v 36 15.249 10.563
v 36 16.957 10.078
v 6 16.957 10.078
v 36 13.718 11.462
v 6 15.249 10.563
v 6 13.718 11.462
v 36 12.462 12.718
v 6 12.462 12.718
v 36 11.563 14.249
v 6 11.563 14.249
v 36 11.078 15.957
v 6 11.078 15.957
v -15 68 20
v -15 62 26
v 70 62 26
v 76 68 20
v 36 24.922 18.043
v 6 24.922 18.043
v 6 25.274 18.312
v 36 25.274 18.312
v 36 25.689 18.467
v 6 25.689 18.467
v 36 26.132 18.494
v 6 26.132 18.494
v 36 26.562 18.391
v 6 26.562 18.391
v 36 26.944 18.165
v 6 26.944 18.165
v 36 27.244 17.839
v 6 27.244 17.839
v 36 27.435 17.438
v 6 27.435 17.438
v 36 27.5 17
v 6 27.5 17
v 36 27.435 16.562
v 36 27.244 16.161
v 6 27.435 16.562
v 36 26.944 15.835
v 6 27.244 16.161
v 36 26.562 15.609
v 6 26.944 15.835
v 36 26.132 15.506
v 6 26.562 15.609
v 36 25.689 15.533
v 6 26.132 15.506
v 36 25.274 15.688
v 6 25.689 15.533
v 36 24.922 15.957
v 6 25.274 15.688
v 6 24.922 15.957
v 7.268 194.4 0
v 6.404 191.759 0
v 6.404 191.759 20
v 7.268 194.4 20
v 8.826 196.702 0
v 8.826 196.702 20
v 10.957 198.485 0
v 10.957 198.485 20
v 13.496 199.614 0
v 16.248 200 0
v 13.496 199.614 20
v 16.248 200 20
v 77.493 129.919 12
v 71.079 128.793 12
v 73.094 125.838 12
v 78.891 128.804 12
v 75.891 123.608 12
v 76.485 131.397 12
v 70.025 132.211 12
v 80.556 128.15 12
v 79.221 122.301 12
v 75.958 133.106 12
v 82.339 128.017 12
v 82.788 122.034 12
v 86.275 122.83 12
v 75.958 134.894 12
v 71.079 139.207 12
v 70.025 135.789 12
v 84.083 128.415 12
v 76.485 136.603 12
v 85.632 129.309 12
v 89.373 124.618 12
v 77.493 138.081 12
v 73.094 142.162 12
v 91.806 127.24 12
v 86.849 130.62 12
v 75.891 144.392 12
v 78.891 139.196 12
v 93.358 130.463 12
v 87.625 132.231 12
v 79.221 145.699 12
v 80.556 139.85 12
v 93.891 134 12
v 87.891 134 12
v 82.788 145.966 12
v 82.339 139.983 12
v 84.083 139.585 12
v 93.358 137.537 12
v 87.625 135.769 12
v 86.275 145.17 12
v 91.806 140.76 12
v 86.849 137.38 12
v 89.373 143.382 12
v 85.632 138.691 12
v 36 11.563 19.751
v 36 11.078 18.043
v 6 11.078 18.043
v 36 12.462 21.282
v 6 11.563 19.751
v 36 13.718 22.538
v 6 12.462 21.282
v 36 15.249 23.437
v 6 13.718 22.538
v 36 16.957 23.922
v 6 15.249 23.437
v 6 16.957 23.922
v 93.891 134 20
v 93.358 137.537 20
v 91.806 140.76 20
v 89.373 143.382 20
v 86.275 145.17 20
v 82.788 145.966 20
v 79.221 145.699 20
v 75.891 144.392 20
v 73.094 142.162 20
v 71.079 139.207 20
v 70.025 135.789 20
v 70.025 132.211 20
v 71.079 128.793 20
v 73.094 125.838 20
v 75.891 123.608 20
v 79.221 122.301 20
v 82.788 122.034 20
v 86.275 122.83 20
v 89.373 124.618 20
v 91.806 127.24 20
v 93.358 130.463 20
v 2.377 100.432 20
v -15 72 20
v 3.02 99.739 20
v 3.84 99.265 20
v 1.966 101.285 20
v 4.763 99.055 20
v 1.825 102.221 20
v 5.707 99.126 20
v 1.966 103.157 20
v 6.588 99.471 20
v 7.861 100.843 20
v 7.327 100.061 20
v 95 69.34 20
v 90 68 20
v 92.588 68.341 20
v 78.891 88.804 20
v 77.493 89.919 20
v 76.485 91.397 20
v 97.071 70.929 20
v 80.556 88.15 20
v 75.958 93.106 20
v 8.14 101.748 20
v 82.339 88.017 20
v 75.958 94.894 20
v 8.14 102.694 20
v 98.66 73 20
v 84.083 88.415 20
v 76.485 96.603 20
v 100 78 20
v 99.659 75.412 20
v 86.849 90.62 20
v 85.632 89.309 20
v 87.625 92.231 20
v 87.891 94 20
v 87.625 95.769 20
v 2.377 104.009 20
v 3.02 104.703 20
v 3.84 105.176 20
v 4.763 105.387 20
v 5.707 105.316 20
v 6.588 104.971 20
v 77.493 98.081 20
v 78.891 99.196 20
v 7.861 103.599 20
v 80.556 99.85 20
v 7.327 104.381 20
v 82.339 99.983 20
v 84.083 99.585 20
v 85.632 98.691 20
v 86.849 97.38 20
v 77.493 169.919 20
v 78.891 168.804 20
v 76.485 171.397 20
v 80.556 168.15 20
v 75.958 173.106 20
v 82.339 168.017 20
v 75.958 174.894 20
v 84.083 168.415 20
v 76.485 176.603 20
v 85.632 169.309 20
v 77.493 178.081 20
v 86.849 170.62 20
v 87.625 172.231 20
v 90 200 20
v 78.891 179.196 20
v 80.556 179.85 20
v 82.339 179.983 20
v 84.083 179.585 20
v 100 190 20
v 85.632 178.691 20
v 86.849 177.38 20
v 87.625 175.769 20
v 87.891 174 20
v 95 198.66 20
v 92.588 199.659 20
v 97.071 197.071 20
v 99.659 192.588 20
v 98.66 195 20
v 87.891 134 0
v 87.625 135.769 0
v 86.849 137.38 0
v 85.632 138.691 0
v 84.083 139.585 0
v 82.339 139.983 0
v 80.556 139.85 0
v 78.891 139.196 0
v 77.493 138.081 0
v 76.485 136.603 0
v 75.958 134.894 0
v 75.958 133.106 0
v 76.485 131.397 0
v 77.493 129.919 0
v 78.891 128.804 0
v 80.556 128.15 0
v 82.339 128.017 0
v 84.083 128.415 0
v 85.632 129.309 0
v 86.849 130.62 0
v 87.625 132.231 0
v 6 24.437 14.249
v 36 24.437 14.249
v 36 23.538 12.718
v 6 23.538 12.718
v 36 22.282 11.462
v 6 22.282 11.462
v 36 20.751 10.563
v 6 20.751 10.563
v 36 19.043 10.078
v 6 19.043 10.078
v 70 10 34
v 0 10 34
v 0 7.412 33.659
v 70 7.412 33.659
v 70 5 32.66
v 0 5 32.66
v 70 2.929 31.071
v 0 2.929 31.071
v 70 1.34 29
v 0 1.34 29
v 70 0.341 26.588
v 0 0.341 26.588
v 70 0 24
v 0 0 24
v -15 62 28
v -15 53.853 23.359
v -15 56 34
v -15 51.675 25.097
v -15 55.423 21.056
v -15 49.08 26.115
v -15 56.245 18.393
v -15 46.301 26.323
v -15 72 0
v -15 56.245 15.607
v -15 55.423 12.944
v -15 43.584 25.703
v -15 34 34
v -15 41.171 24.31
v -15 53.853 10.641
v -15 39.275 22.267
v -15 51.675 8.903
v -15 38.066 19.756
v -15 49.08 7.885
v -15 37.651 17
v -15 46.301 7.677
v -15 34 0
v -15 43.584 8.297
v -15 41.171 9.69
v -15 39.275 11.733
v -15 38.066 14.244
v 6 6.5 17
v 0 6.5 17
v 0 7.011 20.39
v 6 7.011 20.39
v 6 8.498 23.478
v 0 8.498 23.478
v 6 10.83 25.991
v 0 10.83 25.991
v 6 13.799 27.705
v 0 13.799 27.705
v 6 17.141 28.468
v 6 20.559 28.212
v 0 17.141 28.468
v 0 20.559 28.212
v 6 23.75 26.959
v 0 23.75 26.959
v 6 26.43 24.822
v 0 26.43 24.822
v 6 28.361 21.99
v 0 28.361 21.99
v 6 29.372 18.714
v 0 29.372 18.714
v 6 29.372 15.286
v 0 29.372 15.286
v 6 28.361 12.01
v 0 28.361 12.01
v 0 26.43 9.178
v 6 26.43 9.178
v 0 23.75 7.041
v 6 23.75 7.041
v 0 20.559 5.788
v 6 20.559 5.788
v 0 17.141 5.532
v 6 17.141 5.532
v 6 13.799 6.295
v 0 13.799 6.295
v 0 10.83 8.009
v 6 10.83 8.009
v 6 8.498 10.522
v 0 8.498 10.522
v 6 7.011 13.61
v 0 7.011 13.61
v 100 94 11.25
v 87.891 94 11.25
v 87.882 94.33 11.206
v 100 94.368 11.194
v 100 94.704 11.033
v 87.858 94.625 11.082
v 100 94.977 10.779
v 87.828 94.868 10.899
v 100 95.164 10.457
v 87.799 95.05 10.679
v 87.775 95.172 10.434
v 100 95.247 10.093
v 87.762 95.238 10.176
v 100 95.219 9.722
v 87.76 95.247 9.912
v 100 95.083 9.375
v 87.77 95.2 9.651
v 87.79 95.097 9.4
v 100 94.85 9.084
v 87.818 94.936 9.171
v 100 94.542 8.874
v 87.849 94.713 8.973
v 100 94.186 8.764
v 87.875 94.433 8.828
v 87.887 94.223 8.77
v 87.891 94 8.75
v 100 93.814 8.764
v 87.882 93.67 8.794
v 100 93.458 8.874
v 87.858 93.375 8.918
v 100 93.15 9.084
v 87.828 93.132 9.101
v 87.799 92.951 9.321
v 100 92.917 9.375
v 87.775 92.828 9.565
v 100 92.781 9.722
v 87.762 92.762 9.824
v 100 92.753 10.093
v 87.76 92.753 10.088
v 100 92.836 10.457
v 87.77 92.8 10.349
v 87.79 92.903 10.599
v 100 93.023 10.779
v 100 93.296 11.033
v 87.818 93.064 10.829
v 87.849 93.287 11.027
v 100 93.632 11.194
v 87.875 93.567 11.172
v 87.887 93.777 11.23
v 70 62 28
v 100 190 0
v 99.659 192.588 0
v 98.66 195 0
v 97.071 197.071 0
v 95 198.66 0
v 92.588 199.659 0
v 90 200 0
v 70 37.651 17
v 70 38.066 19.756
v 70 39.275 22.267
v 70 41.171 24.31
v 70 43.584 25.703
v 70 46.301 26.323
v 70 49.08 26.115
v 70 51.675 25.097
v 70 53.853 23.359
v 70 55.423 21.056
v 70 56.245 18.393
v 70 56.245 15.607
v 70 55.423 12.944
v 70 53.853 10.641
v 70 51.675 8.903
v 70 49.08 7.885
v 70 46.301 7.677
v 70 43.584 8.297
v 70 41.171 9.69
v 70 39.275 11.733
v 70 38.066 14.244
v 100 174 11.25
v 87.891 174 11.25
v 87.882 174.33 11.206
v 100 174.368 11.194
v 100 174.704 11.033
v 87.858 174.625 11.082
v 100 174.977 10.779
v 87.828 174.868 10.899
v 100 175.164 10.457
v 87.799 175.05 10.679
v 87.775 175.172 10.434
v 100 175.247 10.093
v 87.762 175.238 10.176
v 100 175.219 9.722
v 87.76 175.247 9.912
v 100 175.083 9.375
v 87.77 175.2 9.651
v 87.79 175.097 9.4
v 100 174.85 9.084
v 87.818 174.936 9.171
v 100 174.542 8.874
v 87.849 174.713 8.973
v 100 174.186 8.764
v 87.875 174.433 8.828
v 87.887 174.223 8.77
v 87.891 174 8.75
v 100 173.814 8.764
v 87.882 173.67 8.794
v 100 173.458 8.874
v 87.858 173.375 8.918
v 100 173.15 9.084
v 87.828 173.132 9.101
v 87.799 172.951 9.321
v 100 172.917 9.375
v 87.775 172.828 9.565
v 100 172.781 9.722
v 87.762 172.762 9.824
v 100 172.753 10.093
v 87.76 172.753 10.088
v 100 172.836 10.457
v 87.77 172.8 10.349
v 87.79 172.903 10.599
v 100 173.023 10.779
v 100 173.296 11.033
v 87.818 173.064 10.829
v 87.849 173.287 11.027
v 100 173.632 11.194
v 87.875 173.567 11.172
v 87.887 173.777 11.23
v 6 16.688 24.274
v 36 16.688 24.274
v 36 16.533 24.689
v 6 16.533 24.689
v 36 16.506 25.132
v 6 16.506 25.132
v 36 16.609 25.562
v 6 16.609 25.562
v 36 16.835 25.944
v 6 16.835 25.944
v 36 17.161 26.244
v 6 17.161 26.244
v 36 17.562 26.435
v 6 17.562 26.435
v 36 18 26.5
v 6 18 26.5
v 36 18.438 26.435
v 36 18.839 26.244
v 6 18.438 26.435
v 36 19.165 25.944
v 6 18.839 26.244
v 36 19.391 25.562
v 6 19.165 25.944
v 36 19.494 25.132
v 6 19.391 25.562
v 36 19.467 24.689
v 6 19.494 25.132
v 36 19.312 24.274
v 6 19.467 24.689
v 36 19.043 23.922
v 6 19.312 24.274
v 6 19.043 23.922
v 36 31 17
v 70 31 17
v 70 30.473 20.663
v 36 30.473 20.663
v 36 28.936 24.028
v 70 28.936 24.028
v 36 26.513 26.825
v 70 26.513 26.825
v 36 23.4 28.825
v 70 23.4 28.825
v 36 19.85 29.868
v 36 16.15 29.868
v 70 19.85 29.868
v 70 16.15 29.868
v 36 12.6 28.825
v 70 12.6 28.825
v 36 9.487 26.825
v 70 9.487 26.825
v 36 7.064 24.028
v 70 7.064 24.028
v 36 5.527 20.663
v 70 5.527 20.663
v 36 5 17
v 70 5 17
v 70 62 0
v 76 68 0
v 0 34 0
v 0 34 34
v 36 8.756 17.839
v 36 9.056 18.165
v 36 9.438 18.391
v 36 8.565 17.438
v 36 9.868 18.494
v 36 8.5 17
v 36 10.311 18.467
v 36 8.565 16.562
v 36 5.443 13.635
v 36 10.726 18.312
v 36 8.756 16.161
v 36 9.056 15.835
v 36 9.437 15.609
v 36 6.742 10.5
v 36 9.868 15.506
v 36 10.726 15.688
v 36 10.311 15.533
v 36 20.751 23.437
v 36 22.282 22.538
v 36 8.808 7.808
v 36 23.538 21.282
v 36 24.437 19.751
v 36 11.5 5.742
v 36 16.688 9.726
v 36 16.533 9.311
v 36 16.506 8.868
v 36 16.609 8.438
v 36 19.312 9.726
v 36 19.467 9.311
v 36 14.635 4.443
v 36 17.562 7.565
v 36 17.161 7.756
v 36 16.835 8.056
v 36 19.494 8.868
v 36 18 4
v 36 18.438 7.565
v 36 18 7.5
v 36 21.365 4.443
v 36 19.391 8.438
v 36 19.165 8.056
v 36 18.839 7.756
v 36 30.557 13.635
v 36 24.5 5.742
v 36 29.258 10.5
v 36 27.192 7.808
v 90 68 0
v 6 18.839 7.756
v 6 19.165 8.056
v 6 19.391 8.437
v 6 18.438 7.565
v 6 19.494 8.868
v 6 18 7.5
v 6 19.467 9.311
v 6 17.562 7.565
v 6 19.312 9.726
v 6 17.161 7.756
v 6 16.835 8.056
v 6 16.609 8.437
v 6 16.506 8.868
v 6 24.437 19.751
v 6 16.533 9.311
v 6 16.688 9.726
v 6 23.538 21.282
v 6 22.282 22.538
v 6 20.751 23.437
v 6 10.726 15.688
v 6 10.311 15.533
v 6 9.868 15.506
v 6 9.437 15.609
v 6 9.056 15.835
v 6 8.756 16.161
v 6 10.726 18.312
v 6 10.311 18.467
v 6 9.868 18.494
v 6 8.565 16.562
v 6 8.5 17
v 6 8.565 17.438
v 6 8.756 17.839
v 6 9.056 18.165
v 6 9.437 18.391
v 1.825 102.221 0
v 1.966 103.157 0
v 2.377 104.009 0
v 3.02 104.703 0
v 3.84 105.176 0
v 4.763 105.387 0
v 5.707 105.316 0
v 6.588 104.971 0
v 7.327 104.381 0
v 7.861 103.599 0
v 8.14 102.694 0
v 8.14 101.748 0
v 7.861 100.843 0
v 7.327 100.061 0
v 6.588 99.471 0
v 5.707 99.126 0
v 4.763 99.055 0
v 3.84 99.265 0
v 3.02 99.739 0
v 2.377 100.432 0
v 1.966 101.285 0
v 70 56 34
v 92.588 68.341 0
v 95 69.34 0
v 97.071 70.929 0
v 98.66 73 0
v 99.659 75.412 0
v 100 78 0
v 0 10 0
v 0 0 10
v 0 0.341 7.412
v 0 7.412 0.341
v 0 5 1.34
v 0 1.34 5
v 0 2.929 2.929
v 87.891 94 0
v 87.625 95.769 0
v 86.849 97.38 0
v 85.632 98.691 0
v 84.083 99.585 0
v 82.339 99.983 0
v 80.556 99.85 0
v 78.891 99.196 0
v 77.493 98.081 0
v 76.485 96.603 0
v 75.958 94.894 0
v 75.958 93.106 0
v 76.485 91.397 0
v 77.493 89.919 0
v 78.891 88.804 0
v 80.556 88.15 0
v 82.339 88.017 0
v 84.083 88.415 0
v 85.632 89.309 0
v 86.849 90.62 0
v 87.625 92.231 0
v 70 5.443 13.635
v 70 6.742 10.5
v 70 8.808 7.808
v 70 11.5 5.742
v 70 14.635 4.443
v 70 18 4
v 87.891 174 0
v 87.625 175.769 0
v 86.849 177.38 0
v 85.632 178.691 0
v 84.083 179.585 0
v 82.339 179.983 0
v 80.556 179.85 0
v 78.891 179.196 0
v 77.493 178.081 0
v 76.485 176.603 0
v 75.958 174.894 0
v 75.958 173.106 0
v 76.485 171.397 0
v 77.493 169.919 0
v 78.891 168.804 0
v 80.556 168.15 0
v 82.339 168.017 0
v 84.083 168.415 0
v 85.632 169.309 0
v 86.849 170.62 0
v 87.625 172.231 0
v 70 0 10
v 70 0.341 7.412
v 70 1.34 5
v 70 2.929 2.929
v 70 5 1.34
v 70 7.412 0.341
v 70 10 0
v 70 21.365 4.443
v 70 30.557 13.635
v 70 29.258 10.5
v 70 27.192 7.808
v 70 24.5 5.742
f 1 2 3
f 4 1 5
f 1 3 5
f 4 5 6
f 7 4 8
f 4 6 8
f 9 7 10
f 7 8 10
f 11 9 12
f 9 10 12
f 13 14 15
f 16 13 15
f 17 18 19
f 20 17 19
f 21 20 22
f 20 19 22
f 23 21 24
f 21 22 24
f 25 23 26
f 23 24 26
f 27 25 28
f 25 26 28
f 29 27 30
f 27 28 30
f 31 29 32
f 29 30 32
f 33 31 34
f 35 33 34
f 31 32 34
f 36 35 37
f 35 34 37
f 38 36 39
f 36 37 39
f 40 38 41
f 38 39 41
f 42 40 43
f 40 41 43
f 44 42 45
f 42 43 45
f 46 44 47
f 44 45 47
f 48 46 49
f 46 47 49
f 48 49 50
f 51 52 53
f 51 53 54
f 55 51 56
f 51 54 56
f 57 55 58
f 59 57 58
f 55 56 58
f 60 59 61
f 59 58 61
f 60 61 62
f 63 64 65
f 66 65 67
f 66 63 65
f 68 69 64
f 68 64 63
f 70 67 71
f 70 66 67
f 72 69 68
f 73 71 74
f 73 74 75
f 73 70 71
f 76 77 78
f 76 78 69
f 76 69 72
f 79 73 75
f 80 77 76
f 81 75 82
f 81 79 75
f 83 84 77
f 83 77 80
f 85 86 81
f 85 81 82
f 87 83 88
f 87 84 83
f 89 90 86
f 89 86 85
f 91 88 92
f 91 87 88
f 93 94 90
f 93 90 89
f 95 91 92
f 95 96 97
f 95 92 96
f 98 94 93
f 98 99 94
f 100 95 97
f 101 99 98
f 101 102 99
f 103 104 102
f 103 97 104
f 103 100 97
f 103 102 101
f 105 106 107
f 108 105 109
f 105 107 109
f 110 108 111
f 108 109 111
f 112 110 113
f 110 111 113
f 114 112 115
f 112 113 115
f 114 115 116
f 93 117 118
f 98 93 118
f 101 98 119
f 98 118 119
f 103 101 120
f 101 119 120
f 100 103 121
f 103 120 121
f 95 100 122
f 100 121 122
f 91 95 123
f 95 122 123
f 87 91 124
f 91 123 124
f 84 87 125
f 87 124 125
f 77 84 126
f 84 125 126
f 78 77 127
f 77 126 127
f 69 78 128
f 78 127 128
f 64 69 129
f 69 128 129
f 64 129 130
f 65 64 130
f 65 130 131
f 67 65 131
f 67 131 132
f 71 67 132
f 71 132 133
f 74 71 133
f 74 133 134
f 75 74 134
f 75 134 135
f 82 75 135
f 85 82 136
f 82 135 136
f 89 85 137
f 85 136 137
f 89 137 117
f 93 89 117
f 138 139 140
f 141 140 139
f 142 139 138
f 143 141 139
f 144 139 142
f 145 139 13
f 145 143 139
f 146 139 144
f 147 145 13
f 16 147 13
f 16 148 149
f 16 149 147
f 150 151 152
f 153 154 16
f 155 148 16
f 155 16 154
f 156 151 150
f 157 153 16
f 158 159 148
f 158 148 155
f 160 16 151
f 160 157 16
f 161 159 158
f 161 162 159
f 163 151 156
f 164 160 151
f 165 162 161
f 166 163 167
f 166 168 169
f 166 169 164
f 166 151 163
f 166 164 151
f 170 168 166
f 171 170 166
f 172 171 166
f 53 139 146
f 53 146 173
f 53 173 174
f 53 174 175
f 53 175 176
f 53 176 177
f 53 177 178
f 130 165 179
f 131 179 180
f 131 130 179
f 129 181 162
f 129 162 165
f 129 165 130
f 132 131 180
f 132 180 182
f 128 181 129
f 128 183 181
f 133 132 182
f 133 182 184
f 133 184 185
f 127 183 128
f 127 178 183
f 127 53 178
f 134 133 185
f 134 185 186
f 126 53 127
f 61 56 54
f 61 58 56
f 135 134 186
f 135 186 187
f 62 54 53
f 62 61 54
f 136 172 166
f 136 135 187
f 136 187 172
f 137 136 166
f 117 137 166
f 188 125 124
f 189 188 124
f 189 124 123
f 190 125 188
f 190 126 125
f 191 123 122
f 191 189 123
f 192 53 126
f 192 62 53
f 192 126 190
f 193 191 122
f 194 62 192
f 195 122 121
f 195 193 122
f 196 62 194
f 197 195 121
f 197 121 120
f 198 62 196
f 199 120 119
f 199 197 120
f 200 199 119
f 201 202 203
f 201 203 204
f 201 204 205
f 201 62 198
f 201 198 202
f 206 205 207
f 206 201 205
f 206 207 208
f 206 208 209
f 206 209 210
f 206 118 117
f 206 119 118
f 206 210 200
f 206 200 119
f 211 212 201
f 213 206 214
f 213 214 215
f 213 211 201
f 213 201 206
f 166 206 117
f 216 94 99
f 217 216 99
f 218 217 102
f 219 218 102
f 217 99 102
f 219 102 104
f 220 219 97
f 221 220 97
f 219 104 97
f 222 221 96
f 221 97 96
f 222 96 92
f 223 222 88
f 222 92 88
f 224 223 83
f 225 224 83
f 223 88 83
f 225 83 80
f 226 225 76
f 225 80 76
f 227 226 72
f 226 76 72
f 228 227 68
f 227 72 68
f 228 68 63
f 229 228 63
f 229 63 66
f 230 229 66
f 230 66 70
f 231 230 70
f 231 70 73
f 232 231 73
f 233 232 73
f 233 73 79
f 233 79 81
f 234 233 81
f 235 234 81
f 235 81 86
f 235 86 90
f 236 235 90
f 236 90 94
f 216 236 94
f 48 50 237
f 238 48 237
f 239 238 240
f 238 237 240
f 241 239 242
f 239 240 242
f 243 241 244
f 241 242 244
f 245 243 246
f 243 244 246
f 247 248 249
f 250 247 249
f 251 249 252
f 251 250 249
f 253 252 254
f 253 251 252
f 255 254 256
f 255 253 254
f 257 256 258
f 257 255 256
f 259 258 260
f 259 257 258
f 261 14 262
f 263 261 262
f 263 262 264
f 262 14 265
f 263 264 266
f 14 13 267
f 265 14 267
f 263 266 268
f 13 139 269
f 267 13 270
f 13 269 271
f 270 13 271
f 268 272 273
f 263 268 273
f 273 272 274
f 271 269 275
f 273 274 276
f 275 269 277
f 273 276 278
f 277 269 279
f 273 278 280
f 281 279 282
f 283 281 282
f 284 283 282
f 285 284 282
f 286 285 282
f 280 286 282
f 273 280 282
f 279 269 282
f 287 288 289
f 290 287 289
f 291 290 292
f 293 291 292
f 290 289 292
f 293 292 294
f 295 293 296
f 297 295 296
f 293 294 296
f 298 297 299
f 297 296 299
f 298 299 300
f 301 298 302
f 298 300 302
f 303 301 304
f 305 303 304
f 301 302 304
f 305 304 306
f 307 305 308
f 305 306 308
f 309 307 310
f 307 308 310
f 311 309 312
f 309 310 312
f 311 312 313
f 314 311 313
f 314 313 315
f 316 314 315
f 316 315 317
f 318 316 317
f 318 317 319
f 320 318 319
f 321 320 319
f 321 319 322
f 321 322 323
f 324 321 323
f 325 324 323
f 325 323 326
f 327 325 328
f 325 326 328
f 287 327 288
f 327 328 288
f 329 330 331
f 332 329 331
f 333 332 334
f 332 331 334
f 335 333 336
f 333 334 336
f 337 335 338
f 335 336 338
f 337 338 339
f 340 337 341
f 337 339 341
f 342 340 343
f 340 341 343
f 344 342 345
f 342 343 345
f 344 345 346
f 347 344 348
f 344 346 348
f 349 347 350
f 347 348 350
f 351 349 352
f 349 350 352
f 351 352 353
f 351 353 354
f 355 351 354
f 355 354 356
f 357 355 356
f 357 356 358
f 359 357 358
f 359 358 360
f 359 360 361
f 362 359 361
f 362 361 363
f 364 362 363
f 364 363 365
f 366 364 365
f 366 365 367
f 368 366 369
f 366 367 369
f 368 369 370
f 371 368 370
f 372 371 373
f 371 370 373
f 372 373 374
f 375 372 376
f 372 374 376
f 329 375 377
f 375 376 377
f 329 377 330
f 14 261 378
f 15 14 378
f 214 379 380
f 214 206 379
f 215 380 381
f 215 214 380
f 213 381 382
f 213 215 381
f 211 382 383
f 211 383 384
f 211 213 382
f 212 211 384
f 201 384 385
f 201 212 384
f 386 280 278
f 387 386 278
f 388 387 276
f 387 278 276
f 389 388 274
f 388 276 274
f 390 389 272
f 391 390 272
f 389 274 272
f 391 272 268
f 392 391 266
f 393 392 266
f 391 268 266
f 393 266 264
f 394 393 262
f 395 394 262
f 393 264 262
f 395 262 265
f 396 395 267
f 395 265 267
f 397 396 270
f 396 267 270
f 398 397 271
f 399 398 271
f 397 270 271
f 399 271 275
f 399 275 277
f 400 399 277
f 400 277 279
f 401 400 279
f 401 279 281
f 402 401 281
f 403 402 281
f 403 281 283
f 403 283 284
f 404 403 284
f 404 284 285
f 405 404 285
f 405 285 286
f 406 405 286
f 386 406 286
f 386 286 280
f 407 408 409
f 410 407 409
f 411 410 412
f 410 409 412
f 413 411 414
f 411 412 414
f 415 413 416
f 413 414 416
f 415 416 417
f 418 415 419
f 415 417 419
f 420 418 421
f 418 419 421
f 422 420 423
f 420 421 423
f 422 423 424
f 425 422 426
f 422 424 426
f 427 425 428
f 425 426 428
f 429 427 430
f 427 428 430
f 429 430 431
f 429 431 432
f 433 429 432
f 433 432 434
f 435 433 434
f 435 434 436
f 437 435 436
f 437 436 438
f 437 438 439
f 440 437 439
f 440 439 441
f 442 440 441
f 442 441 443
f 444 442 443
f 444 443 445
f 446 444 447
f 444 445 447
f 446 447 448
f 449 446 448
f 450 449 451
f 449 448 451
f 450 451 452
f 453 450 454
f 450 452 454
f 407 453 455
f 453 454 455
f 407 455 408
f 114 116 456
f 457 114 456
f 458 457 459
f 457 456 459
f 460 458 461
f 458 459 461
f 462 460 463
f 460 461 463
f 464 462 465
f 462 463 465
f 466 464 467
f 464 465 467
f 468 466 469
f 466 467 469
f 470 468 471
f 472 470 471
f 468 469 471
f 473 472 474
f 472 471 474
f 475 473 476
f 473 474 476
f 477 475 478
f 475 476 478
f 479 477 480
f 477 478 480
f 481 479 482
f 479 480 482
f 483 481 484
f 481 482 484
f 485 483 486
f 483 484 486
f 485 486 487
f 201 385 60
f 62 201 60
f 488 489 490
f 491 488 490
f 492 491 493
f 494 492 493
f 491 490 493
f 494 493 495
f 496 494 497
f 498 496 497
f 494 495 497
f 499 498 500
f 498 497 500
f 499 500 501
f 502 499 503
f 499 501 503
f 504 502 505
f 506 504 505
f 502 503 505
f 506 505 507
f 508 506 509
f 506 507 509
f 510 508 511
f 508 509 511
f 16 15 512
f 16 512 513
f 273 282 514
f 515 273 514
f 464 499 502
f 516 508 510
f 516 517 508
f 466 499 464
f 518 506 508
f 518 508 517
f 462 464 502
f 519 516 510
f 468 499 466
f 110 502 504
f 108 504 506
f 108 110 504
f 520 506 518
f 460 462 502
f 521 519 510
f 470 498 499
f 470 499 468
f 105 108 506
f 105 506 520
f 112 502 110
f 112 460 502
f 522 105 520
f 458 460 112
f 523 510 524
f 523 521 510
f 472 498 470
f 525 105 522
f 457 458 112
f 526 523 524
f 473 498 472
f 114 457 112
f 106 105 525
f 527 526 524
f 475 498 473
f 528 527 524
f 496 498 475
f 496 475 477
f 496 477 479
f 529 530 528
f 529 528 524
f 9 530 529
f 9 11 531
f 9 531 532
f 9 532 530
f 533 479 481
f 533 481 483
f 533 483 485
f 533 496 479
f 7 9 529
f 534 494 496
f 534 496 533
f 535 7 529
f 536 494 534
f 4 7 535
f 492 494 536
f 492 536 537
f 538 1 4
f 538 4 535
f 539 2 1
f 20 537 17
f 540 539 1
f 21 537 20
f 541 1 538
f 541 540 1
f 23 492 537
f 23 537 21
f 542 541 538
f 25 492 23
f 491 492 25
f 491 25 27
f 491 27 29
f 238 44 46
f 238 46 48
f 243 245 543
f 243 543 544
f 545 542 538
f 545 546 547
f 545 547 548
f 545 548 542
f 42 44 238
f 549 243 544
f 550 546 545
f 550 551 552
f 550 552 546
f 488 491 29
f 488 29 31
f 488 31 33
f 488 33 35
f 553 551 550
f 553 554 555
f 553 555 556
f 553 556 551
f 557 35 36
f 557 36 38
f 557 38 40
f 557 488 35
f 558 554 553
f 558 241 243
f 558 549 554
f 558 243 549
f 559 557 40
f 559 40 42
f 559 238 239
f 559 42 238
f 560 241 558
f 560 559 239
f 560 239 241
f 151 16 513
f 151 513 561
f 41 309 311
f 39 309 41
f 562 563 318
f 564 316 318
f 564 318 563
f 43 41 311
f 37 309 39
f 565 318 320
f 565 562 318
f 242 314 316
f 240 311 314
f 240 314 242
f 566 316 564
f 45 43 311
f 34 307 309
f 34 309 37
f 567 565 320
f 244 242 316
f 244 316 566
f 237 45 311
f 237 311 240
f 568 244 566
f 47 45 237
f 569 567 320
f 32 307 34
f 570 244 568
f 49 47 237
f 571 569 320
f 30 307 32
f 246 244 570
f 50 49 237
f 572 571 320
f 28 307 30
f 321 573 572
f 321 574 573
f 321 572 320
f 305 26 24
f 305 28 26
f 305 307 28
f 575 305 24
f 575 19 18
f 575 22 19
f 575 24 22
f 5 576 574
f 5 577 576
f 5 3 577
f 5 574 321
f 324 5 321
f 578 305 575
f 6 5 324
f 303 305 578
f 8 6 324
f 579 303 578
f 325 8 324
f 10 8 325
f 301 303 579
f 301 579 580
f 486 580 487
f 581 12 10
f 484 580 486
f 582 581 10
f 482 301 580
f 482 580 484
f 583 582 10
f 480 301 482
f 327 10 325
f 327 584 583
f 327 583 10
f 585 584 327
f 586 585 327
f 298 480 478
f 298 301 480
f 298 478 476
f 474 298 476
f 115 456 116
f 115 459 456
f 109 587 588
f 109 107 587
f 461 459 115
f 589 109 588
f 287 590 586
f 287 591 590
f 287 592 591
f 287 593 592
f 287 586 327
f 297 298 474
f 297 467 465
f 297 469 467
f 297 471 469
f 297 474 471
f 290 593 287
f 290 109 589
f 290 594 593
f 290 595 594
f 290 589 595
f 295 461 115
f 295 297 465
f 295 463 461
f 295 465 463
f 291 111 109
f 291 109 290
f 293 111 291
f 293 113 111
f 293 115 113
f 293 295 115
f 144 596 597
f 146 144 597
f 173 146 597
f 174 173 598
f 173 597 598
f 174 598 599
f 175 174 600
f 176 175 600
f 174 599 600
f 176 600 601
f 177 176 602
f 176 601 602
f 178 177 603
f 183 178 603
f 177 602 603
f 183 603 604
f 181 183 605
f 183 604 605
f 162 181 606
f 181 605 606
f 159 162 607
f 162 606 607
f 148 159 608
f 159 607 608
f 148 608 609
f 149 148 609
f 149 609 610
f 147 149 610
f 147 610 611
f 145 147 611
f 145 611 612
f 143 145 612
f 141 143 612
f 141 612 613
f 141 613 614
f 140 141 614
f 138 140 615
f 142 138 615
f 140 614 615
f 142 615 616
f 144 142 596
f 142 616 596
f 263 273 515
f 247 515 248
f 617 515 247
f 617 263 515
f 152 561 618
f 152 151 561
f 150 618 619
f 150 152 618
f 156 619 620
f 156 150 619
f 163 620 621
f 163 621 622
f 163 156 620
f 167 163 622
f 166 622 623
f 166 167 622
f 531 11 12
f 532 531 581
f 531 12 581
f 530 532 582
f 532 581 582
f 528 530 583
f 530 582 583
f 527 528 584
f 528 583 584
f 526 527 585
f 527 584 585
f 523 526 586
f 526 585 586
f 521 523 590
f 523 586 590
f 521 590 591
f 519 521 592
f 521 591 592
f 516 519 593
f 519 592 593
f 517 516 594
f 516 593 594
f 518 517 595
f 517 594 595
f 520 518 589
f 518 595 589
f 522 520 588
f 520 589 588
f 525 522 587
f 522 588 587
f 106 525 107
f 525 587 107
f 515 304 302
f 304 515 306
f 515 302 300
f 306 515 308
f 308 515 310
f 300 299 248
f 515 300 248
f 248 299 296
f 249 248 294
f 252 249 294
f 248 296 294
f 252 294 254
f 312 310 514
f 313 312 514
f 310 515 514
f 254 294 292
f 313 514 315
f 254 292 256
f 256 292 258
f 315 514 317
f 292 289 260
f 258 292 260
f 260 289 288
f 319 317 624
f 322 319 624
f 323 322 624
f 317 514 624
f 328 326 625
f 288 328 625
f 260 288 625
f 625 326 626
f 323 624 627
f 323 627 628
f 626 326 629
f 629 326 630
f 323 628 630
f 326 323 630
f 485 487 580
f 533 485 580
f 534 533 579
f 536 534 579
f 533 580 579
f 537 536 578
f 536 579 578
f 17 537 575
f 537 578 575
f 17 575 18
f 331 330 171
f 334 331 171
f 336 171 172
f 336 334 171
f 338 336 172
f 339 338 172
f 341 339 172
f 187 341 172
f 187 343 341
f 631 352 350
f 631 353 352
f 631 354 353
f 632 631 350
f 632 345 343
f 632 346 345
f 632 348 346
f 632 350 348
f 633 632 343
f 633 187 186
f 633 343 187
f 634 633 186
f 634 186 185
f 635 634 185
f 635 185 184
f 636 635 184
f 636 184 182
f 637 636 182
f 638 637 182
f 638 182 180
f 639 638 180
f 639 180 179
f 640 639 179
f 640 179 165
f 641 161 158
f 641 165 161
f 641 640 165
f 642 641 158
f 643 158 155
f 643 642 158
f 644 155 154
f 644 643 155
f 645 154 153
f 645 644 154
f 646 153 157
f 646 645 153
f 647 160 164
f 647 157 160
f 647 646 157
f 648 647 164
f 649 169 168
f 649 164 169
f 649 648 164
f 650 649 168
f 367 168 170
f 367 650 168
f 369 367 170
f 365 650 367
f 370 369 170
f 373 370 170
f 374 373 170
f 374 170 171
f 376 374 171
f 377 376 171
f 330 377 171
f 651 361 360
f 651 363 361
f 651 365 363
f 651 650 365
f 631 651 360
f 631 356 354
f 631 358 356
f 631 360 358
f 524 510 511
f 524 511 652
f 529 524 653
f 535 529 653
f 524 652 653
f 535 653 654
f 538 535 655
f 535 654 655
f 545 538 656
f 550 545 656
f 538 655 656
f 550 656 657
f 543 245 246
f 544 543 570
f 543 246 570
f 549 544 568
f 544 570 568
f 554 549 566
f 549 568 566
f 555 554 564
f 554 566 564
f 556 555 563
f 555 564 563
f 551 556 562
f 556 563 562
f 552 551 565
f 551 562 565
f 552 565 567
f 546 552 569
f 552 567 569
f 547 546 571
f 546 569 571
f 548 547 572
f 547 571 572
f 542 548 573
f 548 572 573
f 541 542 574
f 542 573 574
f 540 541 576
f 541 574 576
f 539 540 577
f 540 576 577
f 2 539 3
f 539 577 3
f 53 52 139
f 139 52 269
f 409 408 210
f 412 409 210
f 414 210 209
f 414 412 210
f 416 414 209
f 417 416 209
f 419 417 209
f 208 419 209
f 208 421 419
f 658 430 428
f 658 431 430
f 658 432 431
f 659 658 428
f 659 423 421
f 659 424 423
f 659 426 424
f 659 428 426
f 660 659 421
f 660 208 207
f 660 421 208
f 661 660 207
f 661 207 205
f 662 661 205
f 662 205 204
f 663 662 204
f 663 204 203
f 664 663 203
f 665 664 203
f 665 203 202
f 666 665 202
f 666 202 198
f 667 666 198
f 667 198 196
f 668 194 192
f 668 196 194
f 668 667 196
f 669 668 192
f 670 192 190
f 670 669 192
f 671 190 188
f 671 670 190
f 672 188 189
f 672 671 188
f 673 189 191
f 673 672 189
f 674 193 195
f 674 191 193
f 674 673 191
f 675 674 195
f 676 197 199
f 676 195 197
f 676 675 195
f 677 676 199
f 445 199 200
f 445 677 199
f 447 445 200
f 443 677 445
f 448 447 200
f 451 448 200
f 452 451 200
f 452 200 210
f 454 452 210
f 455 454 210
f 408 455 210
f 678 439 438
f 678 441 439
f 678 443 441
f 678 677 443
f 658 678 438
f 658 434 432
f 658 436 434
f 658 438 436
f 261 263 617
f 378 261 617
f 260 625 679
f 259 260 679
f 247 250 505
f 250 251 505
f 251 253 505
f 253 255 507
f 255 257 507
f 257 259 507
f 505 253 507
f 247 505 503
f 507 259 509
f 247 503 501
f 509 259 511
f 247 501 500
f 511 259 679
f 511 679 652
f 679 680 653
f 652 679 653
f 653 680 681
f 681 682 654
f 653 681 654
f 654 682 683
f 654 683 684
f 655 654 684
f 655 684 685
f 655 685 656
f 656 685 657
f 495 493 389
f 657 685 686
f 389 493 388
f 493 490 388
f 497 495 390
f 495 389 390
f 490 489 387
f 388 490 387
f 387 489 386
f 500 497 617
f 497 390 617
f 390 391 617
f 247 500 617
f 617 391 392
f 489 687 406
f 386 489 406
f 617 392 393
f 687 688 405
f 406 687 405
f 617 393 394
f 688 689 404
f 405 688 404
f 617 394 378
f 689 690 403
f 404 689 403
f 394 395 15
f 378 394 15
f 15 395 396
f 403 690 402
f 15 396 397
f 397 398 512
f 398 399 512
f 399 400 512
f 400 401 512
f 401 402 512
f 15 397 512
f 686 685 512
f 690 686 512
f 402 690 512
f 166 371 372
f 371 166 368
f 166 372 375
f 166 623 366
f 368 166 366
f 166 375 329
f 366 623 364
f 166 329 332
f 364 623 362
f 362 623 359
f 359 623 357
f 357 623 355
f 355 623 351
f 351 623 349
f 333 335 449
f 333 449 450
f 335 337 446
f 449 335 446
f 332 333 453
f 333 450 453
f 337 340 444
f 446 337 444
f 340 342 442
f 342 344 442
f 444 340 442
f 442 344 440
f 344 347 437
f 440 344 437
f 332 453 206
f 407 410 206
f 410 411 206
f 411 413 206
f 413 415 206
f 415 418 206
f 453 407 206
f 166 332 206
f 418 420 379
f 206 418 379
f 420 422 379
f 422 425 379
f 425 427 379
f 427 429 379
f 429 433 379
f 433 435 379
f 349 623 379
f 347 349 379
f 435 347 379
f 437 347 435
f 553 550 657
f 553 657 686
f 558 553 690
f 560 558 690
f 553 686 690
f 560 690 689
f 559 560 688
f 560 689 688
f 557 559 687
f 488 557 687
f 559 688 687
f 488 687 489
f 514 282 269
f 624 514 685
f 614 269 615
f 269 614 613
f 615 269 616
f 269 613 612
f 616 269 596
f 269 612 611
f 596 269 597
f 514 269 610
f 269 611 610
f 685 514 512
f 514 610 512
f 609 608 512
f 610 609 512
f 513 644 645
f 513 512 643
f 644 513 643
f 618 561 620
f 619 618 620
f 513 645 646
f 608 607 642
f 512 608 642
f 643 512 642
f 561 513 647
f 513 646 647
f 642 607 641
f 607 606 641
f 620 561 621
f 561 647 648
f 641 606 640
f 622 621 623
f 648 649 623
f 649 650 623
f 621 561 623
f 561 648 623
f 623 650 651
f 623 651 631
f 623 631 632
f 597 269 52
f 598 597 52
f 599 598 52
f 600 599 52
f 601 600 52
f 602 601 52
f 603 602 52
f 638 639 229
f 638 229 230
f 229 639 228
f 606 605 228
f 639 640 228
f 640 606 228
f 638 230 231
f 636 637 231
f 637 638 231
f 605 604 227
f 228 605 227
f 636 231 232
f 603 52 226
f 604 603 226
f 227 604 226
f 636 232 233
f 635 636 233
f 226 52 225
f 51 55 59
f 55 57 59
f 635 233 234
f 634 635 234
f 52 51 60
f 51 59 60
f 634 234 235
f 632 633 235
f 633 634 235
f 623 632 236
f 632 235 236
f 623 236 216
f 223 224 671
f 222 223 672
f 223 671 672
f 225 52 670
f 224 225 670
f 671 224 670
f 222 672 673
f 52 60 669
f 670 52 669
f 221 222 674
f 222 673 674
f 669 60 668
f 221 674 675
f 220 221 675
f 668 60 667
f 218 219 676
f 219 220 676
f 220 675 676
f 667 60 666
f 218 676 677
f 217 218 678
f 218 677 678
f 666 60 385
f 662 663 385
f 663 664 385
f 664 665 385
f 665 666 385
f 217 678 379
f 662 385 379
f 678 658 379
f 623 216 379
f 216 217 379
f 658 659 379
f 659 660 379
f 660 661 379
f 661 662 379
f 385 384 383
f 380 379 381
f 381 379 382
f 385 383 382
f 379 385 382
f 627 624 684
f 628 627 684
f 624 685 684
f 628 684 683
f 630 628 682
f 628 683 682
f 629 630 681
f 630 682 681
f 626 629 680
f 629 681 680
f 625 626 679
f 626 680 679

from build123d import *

# Parameters (mm, degrees)
SKETCH1_R             = 6
BOSS_EXTRUDE1_DEPTH   = 34
SKETCH2_W             = 115
SKETCH2_H             = 138
CUT_EXTRUDE1_DEPTH    = 14
SKETCH3_R             = 12
CUT_EXTRUDE2_DEPTH    = 8
SKETCH4_R             = 6
CUT_EXTRUDE3_DEPTH    = 225.686448189
FILLET1_R             = 10
CHAMFER1_SIZE         = 6
CUT_EXTRUDE8_DEPTH    = 34
SKETCH11_R            = 11.5
CUT_EXTRUDE9_DEPTH    = 6
SKETCH12_R            = 7
CUT_EXTRUDE10_DEPTH   = 224.588908491
FILLET3_R             = 10
SKETCH13_R            = 1.5
CUT_EXTRUDE11_DEPTH   = 224.588908491
M3_TAPPED_HOLE1_D     = 2.5
M3_TAPPED_HOLE1_DEPTH = 20
M3_TAPPED_HOLE1_TIP   = 0.751075774
SKETCH17_R            = 9.349207245
CUT_EXTRUDE12_DEPTH   = 234.197341372
SKETCH18_R            = 3.175
CUT_EXTRUDE13_DEPTH   = 20


with BuildPart() as part:
    # Sketch1 → Boss-Extrude1 (new body)
    with BuildSketch(Plane.XY):
        Polygon((0, 0), (70, 0), (70, 62), (76, 68), (100, 68), (100, 200), (7.876898591, 200), (-15, 72), (-15, 34), (0, 34), align=None)
        with Locations((81.891070834, 174)):
            Circle(SKETCH1_R, mode=Mode.SUBTRACT)
        with Locations((81.891070834, 94)):
            Circle(SKETCH1_R, mode=Mode.SUBTRACT)
    extrude(amount=BOSS_EXTRUDE1_DEPTH)

    # Sketch2 → Cut-Extrude1 (cut)
    with BuildSketch(Plane.XY.offset(34)):
        with Locations((42.5, 131)):
            Rectangle(SKETCH2_W, SKETCH2_H)
    extrude(amount=-CUT_EXTRUDE1_DEPTH, mode=Mode.SUBTRACT)

    # Sketch3 → Cut-Extrude2 (cut)
    with BuildSketch(Plane.XY.offset(20)):
        with Locations((81.891070834, 134)):
            Circle(SKETCH3_R)
    extrude(amount=-CUT_EXTRUDE2_DEPTH, mode=Mode.SUBTRACT)

    # Sketch4 → Cut-Extrude3 (cut, through all)
    with BuildSketch(Plane.XY.offset(12)):
        with Locations((81.891070834, 134)):
            Circle(SKETCH4_R)
    extrude(amount=-CUT_EXTRUDE3_DEPTH, mode=Mode.SUBTRACT)

    # Fillet1
    fillet1_edges = [part.edges().sort_by_distance(p)[0] for p in [
        (7.876898591, 200, 10),
        (100, 200, 10),
        (100, 68, 10),
    ]]
    fillet(fillet1_edges, radius=FILLET1_R)

    # Chamfer1
    chamfer1_edges = [part.edges().sort_by_distance(p)[0] for p in [
        (27.5, 62, 34),
        (27.5, 62, 20),
    ]]
    chamfer(chamfer1_edges, length=CHAMFER1_SIZE)

    # Sketch6 → Cut-Extrude8 (cut)
    with BuildSketch(Plane(origin=(70, 0, 0), x_dir=(0, 0, -1), z_dir=(1, 0, 0))):
        with BuildLine():
            ThreePointArc((-17, 31), (-30, 18), (-17, 5))
            Line((-17, 5), (-17, 31))
        make_face()
        with BuildLine():
            Line((-17, 31), (-17, 5))
            ThreePointArc((-17, 5), (-7.807611845, 8.807611845), (-4, 18))
            ThreePointArc((-4, 18), (-7.807611845, 27.192388155), (-17, 31))
        make_face()
    extrude(amount=-CUT_EXTRUDE8_DEPTH, mode=Mode.SUBTRACT)

    # Sketch11 → Cut-Extrude9 (cut)
    with BuildSketch(Plane.ZY):
        with Locations(Location((17, 18, 0), (0, 0, 270))):
            Circle(SKETCH11_R)
    extrude(amount=-CUT_EXTRUDE9_DEPTH, mode=Mode.SUBTRACT)

    # Sketch12 → Cut-Extrude10 (cut, through all)
    with BuildSketch(Plane.ZY.offset(-6)):
        with Locations(Location((17, 18, 0), (0, 0, 270))):
            Circle(SKETCH12_R)
    extrude(amount=-CUT_EXTRUDE10_DEPTH, mode=Mode.SUBTRACT)

    # Fillet3
    fillet3_edges = [part.edges().sort_by_distance(p)[0] for p in [
        (35, 0, 0),
        (35, 0, 34),
    ]]
    fillet(fillet3_edges, radius=FILLET3_R)

    # Sketch13 → Cut-Extrude11 (cut, through all)
    with BuildSketch(Plane.ZY.offset(-6)):
        with Locations((17, 26)):
            Circle(SKETCH13_R)
        with Locations((25, 18)):
            Circle(SKETCH13_R)
        with Locations((17, 10)):
            Circle(SKETCH13_R)
        with Locations((9, 18)):
            Circle(SKETCH13_R)
    extrude(amount=-CUT_EXTRUDE11_DEPTH, mode=Mode.SUBTRACT)

    # M3 Tapped Hole1
    with Locations(Plane(origin=(100, 0, 0), x_dir=(0, 0, -1), z_dir=(1, 0, 0))):
        with Locations((-10, 174), (-10, 94)):
            Hole(M3_TAPPED_HOLE1_D / 2, depth=M3_TAPPED_HOLE1_DEPTH)
            with Locations((0, 0, -(M3_TAPPED_HOLE1_DEPTH + M3_TAPPED_HOLE1_TIP / 2))):  # 118° drill point
                Cone(0, M3_TAPPED_HOLE1_D / 2, M3_TAPPED_HOLE1_TIP, mode=Mode.SUBTRACT)

    # Sketch17 → Cut-Extrude12 (cut, through all)
    with BuildSketch(Plane.ZY.offset(15)):
        with Locations(Location((17, 47, 0), (0, 0, 270))):
            Circle(SKETCH17_R)
    extrude(amount=-CUT_EXTRUDE12_DEPTH, mode=Mode.SUBTRACT)

    # Sketch18 → Cut-Extrude13 (cut)
    with BuildSketch(Plane(origin=(0, 0, 0), x_dir=(-1, 0, 0), z_dir=(0, 0, -1))):
        with Locations((-5, 102.220957779)):
            Circle(SKETCH18_R)
    extrude(amount=-CUT_EXTRUDE13_DEPTH, mode=Mode.SUBTRACT)


solid = part.part
